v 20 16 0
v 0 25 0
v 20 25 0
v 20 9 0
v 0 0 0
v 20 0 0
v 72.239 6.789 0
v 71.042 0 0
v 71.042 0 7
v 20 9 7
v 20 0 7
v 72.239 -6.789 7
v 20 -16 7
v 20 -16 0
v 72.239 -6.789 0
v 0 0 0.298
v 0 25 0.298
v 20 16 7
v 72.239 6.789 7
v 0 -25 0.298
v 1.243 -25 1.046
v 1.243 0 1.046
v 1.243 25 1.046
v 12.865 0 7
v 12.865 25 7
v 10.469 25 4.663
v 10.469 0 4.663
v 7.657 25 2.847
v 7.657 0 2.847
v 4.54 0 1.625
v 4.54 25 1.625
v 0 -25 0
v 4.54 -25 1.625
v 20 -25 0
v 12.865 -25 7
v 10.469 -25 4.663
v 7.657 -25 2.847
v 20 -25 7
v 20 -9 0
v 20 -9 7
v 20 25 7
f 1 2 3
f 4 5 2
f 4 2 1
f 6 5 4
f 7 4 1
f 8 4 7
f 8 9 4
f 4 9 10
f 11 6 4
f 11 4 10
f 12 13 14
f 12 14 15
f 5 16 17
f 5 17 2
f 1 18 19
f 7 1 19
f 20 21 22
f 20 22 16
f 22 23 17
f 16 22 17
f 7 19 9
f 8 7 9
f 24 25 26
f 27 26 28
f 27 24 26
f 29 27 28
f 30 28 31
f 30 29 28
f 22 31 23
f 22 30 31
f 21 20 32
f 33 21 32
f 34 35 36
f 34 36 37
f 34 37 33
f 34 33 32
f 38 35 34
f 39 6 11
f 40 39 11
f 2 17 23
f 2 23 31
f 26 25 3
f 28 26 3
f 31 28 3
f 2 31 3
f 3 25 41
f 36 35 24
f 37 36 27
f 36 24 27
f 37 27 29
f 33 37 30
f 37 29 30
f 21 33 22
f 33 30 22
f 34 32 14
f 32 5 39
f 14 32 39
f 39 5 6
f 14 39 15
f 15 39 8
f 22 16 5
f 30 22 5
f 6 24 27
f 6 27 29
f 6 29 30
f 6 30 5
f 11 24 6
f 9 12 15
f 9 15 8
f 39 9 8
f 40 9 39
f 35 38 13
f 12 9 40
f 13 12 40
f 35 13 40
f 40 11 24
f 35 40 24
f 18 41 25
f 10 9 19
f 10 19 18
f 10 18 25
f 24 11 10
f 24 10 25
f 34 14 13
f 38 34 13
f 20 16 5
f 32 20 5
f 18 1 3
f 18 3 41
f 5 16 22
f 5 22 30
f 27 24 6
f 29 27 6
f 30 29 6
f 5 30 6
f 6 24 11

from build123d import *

# Parameters (mm, degrees)
F1_DEPTH    = 25
F2_T1_DEPTH = 31.4504398491
F4_DEPTH    = 7


# Not quite as in the source:
# - a fillet or chamfer that OpenCascade refuses, or shapes differently, is made with other operations: its cross-section is extruded or revolved along the edge and cut away or added


with BuildPart() as f1:
    # F0 (on Front) → F1 (new body)
    with BuildSketch(Plane.XZ):
        with BuildLine():
            Line((0, 1), (0, 0))
            Line((0, 0), (20, 0))
            Line((20, 0), (20, 7))
            Line((20, 7), (12.8650542249, 7))
            ThreePointArc((12.8650542249, 7), (7.09770421, 2.5737434285), (0, 1))
        make_face()
    extrude(amount=F1_DEPTH)

    # F2: chamfer of 0.75 x 1.2990381057 on 1 edges, made by hand

    # F2_s2 → F2_t1 (cut)
    with BuildSketch(Plane.XZ.offset(-3.2252199245)):
        with BuildLine():
            Line((1.2434998223, 1.0461045215), (0, 0.2981636822))
            Line((0, 0.2981636822), (0, 1))
            ThreePointArc((0, 1), (0.6449381871, 1.0123894461), (1.2434998223, 1.0461045215))
        make_face()
    extrude(amount=F2_T1_DEPTH, mode=Mode.SUBTRACT)

    # F3 (on face) → F4 (join, through all)
    with BuildSketch(Plane.XY.offset(7)):
        Polygon((71.0415363766, 0), (20, -9), (20, -16), (72.2386068782, -6.7889241728), align=None)
    extrude(amount=-F4_DEPTH)


with BuildPart() as f5_1:
    # F5: instance of F1
    add(f1.part.mirror(Plane.XZ))


solid = Compound([f1.part, f5_1.part])
